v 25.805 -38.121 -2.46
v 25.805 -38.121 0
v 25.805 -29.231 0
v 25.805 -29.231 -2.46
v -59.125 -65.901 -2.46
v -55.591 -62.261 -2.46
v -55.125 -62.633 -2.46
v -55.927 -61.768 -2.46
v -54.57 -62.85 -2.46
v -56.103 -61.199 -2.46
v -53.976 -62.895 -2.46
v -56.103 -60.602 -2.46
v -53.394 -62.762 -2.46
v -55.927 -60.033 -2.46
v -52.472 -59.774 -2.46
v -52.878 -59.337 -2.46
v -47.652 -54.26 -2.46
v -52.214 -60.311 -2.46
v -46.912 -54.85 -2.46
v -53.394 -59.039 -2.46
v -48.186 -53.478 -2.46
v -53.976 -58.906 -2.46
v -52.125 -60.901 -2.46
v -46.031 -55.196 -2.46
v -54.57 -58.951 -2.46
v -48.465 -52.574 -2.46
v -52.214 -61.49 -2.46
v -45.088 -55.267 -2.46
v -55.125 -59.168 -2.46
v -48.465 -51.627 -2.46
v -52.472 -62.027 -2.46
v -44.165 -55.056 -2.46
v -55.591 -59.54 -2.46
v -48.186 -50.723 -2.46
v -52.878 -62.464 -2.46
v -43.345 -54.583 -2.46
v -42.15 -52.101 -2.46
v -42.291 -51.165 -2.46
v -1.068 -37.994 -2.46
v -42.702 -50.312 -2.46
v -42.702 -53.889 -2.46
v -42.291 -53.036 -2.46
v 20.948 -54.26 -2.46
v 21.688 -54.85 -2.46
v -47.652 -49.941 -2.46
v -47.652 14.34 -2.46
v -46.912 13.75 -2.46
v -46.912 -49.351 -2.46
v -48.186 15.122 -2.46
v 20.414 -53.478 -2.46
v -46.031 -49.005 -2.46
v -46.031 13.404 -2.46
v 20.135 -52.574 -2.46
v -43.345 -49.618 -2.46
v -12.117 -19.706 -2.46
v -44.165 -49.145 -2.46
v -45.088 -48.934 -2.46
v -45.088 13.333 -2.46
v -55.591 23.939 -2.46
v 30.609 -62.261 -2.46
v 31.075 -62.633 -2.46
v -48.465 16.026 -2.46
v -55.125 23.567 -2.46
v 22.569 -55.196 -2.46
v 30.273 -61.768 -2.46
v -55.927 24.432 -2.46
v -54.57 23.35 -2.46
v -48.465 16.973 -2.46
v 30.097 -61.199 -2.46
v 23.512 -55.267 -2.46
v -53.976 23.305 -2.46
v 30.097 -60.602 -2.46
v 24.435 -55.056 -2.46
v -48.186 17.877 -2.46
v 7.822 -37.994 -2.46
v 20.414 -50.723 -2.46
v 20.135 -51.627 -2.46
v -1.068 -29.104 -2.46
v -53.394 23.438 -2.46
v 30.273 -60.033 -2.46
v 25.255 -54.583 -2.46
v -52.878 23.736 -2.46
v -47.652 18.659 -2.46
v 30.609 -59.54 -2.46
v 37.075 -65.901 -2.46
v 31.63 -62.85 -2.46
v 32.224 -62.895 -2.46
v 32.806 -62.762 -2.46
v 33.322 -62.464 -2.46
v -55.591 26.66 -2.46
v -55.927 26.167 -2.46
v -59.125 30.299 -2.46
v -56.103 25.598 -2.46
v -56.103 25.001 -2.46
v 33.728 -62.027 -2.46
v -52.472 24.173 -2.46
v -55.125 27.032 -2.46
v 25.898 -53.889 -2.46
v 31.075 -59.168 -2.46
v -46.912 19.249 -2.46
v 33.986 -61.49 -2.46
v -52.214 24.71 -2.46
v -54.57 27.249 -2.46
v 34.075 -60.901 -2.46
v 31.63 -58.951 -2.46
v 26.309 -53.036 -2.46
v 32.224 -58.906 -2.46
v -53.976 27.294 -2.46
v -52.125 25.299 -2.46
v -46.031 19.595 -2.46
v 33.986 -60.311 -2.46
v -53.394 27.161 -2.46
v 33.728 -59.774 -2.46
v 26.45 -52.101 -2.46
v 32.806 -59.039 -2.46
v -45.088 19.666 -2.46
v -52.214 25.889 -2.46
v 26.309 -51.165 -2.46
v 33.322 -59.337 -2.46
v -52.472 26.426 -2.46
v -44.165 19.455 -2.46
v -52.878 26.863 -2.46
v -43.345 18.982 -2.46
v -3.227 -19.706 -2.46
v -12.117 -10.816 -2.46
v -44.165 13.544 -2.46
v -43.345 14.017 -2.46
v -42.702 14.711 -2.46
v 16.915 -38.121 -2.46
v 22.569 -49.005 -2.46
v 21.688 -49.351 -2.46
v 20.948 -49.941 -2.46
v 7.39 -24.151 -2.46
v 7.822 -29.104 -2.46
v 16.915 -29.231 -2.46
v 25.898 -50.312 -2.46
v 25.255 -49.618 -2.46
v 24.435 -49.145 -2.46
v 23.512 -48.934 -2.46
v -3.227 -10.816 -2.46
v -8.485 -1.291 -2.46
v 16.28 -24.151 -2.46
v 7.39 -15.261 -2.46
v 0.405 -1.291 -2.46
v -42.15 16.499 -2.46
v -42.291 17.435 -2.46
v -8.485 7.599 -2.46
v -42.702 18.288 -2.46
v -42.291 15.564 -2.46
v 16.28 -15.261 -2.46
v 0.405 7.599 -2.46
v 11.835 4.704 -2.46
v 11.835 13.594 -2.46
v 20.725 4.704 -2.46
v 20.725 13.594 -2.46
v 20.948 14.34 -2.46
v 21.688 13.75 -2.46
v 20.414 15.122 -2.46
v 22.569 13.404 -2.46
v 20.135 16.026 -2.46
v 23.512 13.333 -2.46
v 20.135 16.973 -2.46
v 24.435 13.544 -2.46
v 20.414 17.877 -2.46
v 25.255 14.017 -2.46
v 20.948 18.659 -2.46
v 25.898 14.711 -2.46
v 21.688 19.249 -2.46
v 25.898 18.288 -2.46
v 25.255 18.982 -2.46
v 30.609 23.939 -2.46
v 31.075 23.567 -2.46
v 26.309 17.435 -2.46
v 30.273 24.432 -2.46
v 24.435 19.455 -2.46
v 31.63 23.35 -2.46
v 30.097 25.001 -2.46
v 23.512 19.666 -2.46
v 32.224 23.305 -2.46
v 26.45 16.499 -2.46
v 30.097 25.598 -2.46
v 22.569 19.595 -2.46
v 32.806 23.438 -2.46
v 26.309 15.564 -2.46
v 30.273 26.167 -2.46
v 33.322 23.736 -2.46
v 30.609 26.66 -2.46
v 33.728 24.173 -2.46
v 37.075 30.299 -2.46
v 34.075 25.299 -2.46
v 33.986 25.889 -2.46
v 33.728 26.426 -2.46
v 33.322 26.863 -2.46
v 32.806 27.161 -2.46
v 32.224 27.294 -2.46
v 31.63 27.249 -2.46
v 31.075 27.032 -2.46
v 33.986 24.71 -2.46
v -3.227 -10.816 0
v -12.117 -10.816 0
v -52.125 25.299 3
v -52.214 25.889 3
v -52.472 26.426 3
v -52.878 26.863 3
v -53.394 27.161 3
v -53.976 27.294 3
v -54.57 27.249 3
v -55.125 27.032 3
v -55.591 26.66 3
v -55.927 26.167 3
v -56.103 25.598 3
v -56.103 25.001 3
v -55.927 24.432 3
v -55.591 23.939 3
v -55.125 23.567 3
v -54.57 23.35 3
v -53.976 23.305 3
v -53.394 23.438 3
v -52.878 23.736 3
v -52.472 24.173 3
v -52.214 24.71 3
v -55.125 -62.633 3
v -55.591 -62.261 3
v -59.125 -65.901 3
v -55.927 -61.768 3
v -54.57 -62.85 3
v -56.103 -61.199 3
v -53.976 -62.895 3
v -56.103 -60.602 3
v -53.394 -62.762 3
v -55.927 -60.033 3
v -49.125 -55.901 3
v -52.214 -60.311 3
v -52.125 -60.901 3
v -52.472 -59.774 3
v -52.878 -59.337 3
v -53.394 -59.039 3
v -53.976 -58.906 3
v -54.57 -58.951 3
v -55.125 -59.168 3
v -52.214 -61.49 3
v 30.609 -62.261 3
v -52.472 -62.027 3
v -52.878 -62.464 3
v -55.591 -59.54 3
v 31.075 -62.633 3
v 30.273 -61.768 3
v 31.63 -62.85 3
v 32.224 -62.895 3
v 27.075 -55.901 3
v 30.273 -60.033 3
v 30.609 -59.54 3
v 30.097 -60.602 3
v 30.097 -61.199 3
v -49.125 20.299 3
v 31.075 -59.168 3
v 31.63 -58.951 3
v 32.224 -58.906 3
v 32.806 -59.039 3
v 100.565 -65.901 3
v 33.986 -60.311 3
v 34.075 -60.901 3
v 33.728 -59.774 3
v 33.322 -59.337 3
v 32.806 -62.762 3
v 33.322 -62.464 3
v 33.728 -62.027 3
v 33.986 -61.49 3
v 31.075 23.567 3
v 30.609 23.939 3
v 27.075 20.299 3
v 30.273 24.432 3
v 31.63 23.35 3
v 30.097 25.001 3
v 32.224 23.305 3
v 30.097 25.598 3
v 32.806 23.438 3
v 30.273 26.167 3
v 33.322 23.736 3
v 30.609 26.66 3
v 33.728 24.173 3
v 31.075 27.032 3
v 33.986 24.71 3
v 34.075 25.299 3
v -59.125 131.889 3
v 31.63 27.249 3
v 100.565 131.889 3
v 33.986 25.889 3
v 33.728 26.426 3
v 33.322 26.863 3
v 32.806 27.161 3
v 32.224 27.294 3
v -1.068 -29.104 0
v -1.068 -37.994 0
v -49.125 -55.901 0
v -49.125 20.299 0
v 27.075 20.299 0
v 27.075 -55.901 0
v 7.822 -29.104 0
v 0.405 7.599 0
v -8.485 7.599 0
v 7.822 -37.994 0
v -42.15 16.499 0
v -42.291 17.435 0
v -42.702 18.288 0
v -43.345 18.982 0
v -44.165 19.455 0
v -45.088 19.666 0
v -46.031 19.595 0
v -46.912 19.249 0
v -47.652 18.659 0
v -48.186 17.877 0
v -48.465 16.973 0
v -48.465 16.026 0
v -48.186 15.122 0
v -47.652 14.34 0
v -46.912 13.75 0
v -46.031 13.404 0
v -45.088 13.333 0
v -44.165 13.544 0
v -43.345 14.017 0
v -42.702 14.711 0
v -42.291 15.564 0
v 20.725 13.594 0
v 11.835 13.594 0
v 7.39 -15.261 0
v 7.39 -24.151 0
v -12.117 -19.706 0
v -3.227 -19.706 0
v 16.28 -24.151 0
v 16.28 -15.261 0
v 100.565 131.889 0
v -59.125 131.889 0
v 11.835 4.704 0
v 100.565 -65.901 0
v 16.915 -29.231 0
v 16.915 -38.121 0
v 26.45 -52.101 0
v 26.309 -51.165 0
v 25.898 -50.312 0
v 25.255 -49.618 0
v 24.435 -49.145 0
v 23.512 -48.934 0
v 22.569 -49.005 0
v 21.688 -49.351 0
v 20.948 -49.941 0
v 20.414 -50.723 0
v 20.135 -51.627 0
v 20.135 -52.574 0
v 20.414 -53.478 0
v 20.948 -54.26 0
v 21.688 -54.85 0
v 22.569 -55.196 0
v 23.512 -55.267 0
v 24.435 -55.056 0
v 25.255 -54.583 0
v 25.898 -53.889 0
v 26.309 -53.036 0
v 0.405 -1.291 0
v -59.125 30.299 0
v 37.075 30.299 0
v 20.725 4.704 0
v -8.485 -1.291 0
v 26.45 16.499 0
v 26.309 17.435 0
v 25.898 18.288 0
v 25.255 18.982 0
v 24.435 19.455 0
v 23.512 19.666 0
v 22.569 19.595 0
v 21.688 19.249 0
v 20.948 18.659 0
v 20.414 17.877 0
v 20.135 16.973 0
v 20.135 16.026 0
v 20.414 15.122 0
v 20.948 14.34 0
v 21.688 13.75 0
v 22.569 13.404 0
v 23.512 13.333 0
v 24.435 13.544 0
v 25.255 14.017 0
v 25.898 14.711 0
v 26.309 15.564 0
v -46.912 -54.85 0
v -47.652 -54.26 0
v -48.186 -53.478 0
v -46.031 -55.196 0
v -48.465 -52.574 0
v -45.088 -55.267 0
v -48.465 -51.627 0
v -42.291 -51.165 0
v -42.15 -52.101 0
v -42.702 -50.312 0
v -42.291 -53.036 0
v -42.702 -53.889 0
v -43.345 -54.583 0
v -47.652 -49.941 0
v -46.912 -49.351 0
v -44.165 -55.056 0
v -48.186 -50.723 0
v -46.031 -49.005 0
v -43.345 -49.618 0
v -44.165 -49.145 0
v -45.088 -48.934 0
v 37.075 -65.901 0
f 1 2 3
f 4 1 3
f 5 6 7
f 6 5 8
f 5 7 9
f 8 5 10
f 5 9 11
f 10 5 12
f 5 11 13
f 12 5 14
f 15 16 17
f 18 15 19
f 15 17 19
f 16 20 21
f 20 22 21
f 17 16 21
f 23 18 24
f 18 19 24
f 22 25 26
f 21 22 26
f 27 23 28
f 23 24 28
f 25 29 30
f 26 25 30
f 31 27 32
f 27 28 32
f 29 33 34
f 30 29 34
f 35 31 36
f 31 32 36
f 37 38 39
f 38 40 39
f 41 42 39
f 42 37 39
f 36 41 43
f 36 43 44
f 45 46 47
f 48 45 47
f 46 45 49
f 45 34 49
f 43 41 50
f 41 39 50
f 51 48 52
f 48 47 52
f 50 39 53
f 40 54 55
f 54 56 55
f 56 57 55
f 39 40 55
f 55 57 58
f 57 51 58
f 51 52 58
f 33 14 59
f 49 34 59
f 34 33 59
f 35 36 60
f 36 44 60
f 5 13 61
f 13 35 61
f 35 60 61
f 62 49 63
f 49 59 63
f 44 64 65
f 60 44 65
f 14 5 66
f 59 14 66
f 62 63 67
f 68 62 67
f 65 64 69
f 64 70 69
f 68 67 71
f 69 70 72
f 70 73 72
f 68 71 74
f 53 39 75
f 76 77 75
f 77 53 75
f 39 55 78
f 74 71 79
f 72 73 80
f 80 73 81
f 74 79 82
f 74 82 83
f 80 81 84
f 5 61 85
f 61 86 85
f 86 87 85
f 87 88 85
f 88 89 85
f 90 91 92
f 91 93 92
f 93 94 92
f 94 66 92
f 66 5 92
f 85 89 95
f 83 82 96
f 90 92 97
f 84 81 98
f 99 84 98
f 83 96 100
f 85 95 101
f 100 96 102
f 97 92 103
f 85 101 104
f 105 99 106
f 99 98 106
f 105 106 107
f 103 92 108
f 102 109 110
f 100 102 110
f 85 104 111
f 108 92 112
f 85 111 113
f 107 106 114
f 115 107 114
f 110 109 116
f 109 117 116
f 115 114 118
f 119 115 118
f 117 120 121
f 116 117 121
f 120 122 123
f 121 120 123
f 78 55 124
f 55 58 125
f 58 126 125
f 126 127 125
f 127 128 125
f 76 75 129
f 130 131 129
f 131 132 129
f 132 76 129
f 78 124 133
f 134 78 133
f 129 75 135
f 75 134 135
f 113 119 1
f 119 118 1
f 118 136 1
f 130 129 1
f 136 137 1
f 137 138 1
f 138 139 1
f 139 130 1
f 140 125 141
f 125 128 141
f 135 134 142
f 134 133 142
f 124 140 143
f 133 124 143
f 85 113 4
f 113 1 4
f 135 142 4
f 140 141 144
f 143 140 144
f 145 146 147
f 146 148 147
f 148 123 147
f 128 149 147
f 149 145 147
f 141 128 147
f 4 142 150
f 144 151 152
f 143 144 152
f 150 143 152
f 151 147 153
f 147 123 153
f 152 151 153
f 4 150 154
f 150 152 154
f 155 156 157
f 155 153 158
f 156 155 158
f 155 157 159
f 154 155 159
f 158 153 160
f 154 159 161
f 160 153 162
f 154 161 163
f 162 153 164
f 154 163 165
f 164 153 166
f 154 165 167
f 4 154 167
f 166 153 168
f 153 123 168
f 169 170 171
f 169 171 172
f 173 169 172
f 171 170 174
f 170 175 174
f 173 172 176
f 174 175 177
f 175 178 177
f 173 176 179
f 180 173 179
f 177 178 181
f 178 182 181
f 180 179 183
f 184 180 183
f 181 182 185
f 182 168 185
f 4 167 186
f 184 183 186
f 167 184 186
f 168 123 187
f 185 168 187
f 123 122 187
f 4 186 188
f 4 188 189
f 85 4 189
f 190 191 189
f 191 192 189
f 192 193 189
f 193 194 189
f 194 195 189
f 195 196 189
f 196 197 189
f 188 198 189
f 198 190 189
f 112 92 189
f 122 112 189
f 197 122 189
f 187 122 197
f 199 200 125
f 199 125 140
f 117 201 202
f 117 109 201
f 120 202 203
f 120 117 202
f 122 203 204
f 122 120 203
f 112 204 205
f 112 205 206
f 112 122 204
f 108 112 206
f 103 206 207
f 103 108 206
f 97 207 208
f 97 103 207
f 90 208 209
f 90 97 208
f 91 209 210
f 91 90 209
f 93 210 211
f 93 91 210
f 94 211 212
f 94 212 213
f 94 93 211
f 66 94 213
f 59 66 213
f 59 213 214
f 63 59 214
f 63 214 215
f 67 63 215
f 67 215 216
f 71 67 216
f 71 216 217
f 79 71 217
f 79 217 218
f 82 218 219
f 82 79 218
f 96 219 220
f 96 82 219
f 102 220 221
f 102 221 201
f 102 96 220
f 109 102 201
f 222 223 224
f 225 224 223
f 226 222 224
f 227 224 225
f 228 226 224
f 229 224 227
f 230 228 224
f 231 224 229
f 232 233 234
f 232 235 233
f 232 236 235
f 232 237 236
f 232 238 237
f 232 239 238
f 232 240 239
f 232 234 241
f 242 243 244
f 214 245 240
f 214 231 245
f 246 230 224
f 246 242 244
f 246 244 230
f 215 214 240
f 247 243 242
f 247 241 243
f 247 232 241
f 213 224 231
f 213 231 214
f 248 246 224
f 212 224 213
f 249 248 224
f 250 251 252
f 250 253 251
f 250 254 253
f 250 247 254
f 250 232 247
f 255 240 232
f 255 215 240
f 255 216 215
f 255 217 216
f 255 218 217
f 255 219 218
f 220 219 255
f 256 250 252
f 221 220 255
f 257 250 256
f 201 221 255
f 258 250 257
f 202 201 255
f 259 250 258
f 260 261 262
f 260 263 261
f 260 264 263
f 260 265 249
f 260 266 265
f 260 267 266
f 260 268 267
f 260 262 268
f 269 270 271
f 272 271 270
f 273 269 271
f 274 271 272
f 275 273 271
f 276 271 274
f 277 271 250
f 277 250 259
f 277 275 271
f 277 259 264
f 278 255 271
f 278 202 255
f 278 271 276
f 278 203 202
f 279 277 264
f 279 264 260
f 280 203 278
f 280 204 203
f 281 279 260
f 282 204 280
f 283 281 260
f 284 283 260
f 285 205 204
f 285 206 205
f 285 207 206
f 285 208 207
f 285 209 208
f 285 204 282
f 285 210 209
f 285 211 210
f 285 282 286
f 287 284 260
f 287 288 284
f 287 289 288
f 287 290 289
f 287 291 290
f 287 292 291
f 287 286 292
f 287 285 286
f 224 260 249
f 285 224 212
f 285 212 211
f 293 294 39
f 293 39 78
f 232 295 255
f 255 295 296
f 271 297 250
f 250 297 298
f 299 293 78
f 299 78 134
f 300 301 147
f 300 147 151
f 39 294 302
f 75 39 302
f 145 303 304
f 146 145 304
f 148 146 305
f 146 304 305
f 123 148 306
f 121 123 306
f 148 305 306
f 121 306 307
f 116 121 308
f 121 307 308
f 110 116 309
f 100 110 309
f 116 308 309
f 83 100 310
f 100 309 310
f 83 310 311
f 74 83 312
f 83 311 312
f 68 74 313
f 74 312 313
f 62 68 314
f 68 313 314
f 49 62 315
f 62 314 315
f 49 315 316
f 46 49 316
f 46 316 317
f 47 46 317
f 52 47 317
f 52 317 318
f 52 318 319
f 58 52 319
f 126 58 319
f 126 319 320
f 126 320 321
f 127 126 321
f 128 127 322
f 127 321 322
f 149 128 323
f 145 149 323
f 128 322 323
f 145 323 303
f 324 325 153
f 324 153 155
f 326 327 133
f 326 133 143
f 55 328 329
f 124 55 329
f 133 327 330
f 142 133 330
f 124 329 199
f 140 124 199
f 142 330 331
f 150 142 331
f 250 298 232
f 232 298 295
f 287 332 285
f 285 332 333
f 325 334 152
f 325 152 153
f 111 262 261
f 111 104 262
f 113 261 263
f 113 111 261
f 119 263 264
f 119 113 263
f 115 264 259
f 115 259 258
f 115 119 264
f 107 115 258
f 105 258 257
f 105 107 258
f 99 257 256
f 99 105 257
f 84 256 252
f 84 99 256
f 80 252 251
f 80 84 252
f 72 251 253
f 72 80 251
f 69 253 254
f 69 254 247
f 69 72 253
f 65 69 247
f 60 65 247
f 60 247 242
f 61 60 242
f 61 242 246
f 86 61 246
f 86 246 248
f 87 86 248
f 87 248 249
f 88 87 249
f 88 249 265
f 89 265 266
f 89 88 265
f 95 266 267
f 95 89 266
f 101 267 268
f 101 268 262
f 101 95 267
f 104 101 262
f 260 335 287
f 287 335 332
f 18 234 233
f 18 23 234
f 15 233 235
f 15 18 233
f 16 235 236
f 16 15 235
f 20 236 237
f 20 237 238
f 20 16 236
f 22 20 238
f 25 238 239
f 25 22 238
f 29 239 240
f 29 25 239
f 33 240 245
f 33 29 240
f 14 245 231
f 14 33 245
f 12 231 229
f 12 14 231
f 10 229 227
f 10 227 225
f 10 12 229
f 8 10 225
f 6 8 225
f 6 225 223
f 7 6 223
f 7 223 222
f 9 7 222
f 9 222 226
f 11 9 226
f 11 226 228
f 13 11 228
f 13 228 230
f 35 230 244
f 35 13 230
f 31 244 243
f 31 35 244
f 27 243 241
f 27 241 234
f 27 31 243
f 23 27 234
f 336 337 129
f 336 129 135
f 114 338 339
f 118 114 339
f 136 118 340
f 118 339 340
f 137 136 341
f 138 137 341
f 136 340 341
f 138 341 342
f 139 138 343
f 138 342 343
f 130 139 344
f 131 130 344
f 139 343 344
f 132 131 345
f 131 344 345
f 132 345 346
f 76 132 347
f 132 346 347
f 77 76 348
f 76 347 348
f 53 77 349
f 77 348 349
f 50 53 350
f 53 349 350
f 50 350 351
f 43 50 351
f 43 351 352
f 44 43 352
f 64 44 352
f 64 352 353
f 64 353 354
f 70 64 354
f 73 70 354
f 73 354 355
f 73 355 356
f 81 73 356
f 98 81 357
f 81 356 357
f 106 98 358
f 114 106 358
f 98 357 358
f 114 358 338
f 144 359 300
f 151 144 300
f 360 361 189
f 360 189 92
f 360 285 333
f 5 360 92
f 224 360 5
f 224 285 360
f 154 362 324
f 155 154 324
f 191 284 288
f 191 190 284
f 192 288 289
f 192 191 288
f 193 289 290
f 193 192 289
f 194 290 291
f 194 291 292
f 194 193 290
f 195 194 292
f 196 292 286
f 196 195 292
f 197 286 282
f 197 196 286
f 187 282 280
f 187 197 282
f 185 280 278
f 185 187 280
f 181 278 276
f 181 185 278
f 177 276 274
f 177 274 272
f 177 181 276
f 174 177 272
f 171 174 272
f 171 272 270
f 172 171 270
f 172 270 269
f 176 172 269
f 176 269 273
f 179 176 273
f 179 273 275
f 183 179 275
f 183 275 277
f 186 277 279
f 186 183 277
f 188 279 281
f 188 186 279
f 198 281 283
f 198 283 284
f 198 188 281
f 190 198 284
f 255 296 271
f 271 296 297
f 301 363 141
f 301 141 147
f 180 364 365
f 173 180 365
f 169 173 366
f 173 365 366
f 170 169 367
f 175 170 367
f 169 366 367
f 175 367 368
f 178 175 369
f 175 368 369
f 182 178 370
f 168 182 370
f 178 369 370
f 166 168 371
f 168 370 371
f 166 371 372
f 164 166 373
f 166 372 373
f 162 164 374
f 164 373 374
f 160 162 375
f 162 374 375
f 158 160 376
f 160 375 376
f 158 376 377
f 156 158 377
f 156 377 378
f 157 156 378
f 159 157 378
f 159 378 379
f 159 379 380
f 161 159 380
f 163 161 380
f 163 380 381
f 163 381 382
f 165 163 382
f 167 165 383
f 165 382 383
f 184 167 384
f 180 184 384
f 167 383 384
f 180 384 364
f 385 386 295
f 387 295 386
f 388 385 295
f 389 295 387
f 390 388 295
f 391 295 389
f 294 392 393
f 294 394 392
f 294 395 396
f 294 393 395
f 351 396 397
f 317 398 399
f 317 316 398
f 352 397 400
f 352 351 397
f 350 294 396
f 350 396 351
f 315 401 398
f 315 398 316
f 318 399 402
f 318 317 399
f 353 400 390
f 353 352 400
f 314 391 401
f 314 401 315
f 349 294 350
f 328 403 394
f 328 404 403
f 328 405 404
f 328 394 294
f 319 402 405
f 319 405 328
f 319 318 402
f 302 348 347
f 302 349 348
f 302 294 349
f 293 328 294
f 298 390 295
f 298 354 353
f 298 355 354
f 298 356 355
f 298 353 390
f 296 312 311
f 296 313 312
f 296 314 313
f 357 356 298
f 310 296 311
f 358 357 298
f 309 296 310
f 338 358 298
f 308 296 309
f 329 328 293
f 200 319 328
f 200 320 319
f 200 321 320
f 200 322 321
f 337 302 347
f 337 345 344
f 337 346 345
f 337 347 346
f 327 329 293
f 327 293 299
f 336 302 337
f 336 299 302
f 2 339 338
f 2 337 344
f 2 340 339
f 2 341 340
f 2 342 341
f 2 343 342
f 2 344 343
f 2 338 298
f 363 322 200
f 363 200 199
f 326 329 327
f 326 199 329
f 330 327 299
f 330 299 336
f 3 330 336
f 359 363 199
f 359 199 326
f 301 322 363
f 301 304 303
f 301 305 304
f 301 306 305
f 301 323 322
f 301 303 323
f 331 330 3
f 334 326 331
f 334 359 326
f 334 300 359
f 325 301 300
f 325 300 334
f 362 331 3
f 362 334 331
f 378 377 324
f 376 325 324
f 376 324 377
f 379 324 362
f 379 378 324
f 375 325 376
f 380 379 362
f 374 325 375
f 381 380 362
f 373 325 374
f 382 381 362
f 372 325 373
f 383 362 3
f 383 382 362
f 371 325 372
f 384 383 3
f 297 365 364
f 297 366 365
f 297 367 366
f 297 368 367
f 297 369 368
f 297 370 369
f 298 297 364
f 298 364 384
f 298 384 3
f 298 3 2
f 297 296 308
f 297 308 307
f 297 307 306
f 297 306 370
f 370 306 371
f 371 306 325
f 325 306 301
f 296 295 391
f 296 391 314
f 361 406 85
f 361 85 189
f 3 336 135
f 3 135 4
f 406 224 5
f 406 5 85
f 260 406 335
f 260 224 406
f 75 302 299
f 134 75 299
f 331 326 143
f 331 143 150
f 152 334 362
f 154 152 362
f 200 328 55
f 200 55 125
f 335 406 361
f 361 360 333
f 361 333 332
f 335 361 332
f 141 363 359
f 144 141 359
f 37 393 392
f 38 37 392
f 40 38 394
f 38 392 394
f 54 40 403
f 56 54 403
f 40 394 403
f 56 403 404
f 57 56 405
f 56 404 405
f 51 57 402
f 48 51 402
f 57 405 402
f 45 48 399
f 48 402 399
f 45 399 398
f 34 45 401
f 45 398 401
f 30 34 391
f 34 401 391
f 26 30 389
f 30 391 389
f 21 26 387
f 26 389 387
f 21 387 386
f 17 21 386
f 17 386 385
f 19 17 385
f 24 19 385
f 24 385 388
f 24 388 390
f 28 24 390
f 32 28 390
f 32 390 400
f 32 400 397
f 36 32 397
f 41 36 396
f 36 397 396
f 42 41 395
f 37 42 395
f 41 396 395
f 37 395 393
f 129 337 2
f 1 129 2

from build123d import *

# Parameters (mm, degrees)
F0_R     = 2
F1_DEPTH = 3
F0_R_2   = 3.175
F0_W     = 8.89
F0_H     = 8.89
F2_DEPTH = 2.46
F3_DEPTH = 3


with BuildPart() as f1:
    # F0 (on Top) → F1 (new body)
    with BuildSketch(Plane.XY):
        Polygon((-49.1249652207, 30.2994954109), (-49.1249652207, 20.2994954109), (-48.8709652207, 20.2994954109), (-45.1879652207, 20.2994954109), (23.1380347793, 20.2994954109), (26.8210347793, 20.2994954109), (27.0750347793, 20.2994954109), (27.0750347793, 20.4264954109), (27.0750347793, 30.2994954109), align=None)
        Polygon((-59.1249652207, 25.2994954109), (-59.1249652207, 20.2994954109), (-54.1249652207, 20.2994954109), (-49.1249652207, 20.2994954109), (-49.1249652207, 30.2994954109), (-59.1249652207, 30.2994954109), align=None)
        with Locations((-54.1249652207, 25.2994954109)):
            Circle(F0_R, mode=Mode.SUBTRACT)
        Polygon((-59.1249652207, -60.9005045891), (-59.1249652207, -65.9005045891), (-54.1249652207, -65.9005045891), (-49.1249652207, -65.9005045891), (-49.1249652207, -55.9005045891), (-59.1249652207, -55.9005045891), align=None)
        with Locations((-54.1249652207, -60.9005045891)):
            Circle(F0_R, mode=Mode.SUBTRACT)
        Polygon((-59.1249652207, -30.5005045891), (-59.1249652207, -55.9005045891), (-49.1249652207, -55.9005045891), (-49.1249652207, -55.6465045891), (-49.1249652207, -54.1503839195), (-49.1249652207, -51.9635045891), (-49.1249652207, -30.5005045891), align=None)
        Polygon((-59.1249652207, 20.2994954109), (-59.1249652207, -30.5005045891), (-49.1249652207, -30.5005045891), (-49.1249652207, 16.3624954109), (-49.1249652207, 20.0454954109), (-49.1249652207, 20.2994954109), (-54.1249652207, 20.2994954109), align=None)
        Polygon((27.0750347793, -55.6465045891), (27.0750347793, -55.9005045891), (27.1951819298, -55.9005045891), (37.0750347793, -55.9005045891), (37.0750347793, 20.2994954109), (32.0750347793, 20.2994954109), (27.3221819298, 20.2994954109), (27.0750347793, 20.2994954109), (27.0750347793, 20.0454954109), (27.0750347793, 16.3624954109), (27.0750347793, 4.7038954109), (27.0750347793, -1.2905045891), (27.0750347793, -19.7055045891), (27.0750347793, -24.1505045891), (27.0750347793, -37.9935045891), (27.0750347793, -38.1205045891), (27.0750347793, -51.9635045891), align=None)
        Polygon((32.0750347793, 20.2994954109), (37.0750347793, 20.2994954109), (37.0750347793, 25.2994954109), (37.0750347793, 30.2994954109), (27.0750347793, 30.2994954109), (27.0750347793, 20.4264954109), (27.0750347793, 20.2994954109), (27.3221819298, 20.2994954109), align=None)
        with Locations((32.0750347793, 25.2994954109)):
            Circle(F0_R, mode=Mode.SUBTRACT)
        Polygon((27.0750347793, -55.9005045891), (27.0750347793, -65.9005045891), (32.0750347793, -65.9005045891), (37.0750347793, -65.9005045891), (37.0750347793, -60.9005045891), (37.0750347793, -55.9005045891), (27.1951819298, -55.9005045891), align=None)
        with Locations((32.0750347793, -60.9005045891)):
            Circle(F0_R, mode=Mode.SUBTRACT)
        Polygon((-49.1249652207, -55.9005045891), (-49.1249652207, -65.9005045891), (27.0750347793, -65.9005045891), (27.0750347793, -55.9005045891), (26.8210347793, -55.9005045891), (26.5670347793, -55.9005045891), (24.5350347793, -55.9005045891), (23.5190347793, -55.9005045891), (23.1380347793, -55.9005045891), (6.5518347793, -55.9005045891), (-0.8649652207, -55.9005045891), (-4.4971652207, -55.9005045891), (-45.1879652207, -55.9005045891), (-48.8709652207, -55.9005045891), align=None)
    extrude(amount=F1_DEPTH)

    # F0 (on Top) → F2 (join)
    with BuildSketch(Plane.XY):
        Polygon((32.0750347793, 20.2994954109), (37.0750347793, 20.2994954109), (37.0750347793, 25.2994954109), (37.0750347793, 30.2994954109), (27.0750347793, 30.2994954109), (27.0750347793, 20.4264954109), (27.0750347793, 20.2994954109), (27.3221819298, 20.2994954109), align=None)
        with Locations((32.0750347793, 25.2994954109)):
            Circle(F0_R, mode=Mode.SUBTRACT)
        Polygon((27.0750347793, -55.6465045891), (27.0750347793, -55.9005045891), (27.1951819298, -55.9005045891), (37.0750347793, -55.9005045891), (37.0750347793, 20.2994954109), (32.0750347793, 20.2994954109), (27.3221819298, 20.2994954109), (27.0750347793, 20.2994954109), (27.0750347793, 20.0454954109), (27.0750347793, 16.3624954109), (27.0750347793, 4.7038954109), (27.0750347793, -1.2905045891), (27.0750347793, -19.7055045891), (27.0750347793, -24.1505045891), (27.0750347793, -37.9935045891), (27.0750347793, -38.1205045891), (27.0750347793, -51.9635045891), align=None)
        Polygon((-49.1249652207, 30.2994954109), (-49.1249652207, 20.2994954109), (-48.8709652207, 20.2994954109), (-45.1879652207, 20.2994954109), (23.1380347793, 20.2994954109), (26.8210347793, 20.2994954109), (27.0750347793, 20.2994954109), (27.0750347793, 20.4264954109), (27.0750347793, 30.2994954109), align=None)
        Polygon((-59.1249652207, 25.2994954109), (-59.1249652207, 20.2994954109), (-54.1249652207, 20.2994954109), (-49.1249652207, 20.2994954109), (-49.1249652207, 30.2994954109), (-59.1249652207, 30.2994954109), align=None)
        with Locations((-54.1249652207, 25.2994954109)):
            Circle(F0_R, mode=Mode.SUBTRACT)
        Polygon((-59.1249652207, 20.2994954109), (-59.1249652207, -30.5005045891), (-49.1249652207, -30.5005045891), (-49.1249652207, 16.3624954109), (-49.1249652207, 20.0454954109), (-49.1249652207, 20.2994954109), (-54.1249652207, 20.2994954109), align=None)
        Polygon((-59.1249652207, -60.9005045891), (-59.1249652207, -65.9005045891), (-54.1249652207, -65.9005045891), (-49.1249652207, -65.9005045891), (-49.1249652207, -55.9005045891), (-59.1249652207, -55.9005045891), align=None)
        with Locations((-54.1249652207, -60.9005045891)):
            Circle(F0_R, mode=Mode.SUBTRACT)
        Polygon((-59.1249652207, -30.5005045891), (-59.1249652207, -55.9005045891), (-49.1249652207, -55.9005045891), (-49.1249652207, -55.6465045891), (-49.1249652207, -54.1503839195), (-49.1249652207, -51.9635045891), (-49.1249652207, -30.5005045891), align=None)
        Polygon((-49.1249652207, -55.9005045891), (-49.1249652207, -65.9005045891), (27.0750347793, -65.9005045891), (27.0750347793, -55.9005045891), (26.8210347793, -55.9005045891), (26.5670347793, -55.9005045891), (24.5350347793, -55.9005045891), (23.5190347793, -55.9005045891), (23.1380347793, -55.9005045891), (6.5518347793, -55.9005045891), (-0.8649652207, -55.9005045891), (-4.4971652207, -55.9005045891), (-45.1879652207, -55.9005045891), (-48.8709652207, -55.9005045891), align=None)
        Polygon((27.0750347793, -55.9005045891), (27.0750347793, -65.9005045891), (32.0750347793, -65.9005045891), (37.0750347793, -65.9005045891), (37.0750347793, -60.9005045891), (37.0750347793, -55.9005045891), (27.1951819298, -55.9005045891), align=None)
        with Locations((32.0750347793, -60.9005045891)):
            Circle(F0_R, mode=Mode.SUBTRACT)
        Polygon((-49.1249652207, -55.6465045891), (-49.1249652207, -55.9005045891), (-48.8709652207, -55.9005045891), (-45.1879652207, -55.9005045891), (-4.4971652207, -55.9005045891), (-0.8649652207, -55.9005045891), (6.5518347793, -55.9005045891), (23.1380347793, -55.9005045891), (23.5190347793, -55.9005045891), (24.5350347793, -55.9005045891), (26.5670347793, -55.9005045891), (26.8210347793, -55.9005045891), (27.0750347793, -55.9005045891), (27.0750347793, -55.6465045891), (27.0750347793, -51.9635045891), (27.0750347793, -38.1205045891), (27.0750347793, -37.9935045891), (27.0750347793, -24.1505045891), (27.0750347793, -19.7055045891), (27.0750347793, -1.2905045891), (27.0750347793, 4.7038954109), (27.0750347793, 16.3624954109), (27.0750347793, 20.0454954109), (27.0750347793, 20.2994954109), (26.8210347793, 20.2994954109), (23.1380347793, 20.2994954109), (-45.1879652207, 20.2994954109), (-48.8709652207, 20.2994954109), (-49.1249652207, 20.2994954109), (-49.1249652207, 20.0454954109), (-49.1249652207, 16.3624954109), (-49.1249652207, -30.5005045891), (-49.1249652207, -51.9635045891), (-49.1249652207, -54.1503839195), align=None)
        with Locations((-45.3249652207, -52.1005045891)):
            Circle(F0_R_2, mode=Mode.SUBTRACT)
        with Locations((3.3768347793, -33.5485045891)):
            Rectangle(F0_W, F0_H, mode=Mode.SUBTRACT)
        with Locations((11.8350347793, -19.7055045891)):
            Rectangle(F0_W, F0_H, mode=Mode.SUBTRACT)
        with Locations((-45.3249652207, 16.4994954109)):
            Circle(F0_R_2, mode=Mode.SUBTRACT)
        with Locations((-7.6721652207, -15.2605045891)):
            Rectangle(F0_W, F0_H, mode=Mode.SUBTRACT)
        with Locations((-4.0399652207, 3.1544954109)):
            Rectangle(F0_W, F0_H, mode=Mode.SUBTRACT)
        with Locations((16.2800347793, 9.1488954109)):
            Rectangle(F0_W, F0_H, mode=Mode.SUBTRACT)
        with Locations((23.2750347793, -52.1005045891)):
            Circle(F0_R_2, mode=Mode.SUBTRACT)
        with Locations((21.3600347793, -33.6755045891)):
            Rectangle(F0_W, F0_H, mode=Mode.SUBTRACT)
        with Locations((23.2750347793, 16.4994954109)):
            Circle(F0_R_2, mode=Mode.SUBTRACT)
    extrude(amount=-F2_DEPTH)

    # F0 (on Top) → F3 (join)
    with BuildSketch(Plane.XY):
        Polygon((-59.1249652207, -60.9005045891), (-59.1249652207, -65.9005045891), (-54.1249652207, -65.9005045891), (-49.1249652207, -65.9005045891), (-49.1249652207, -55.9005045891), (-59.1249652207, -55.9005045891), align=None)
        with Locations((-54.1249652207, -60.9005045891)):
            Circle(F0_R, mode=Mode.SUBTRACT)
        Polygon((-49.1249652207, -55.9005045891), (-49.1249652207, -65.9005045891), (27.0750347793, -65.9005045891), (27.0750347793, -55.9005045891), (26.8210347793, -55.9005045891), (26.5670347793, -55.9005045891), (24.5350347793, -55.9005045891), (23.5190347793, -55.9005045891), (23.1380347793, -55.9005045891), (6.5518347793, -55.9005045891), (-0.8649652207, -55.9005045891), (-4.4971652207, -55.9005045891), (-45.1879652207, -55.9005045891), (-48.8709652207, -55.9005045891), align=None)
        Polygon((-59.1249652207, -30.5005045891), (-59.1249652207, -55.9005045891), (-49.1249652207, -55.9005045891), (-49.1249652207, -55.6465045891), (-49.1249652207, -54.1503839195), (-49.1249652207, -51.9635045891), (-49.1249652207, -30.5005045891), align=None)
        Polygon((27.0750347793, -55.9005045891), (27.0750347793, -65.9005045891), (32.0750347793, -65.9005045891), (37.0750347793, -65.9005045891), (37.0750347793, -60.9005045891), (37.0750347793, -55.9005045891), (27.1951819298, -55.9005045891), align=None)
        with Locations((32.0750347793, -60.9005045891)):
            Circle(F0_R, mode=Mode.SUBTRACT)
        Polygon((-59.1249652207, 20.2994954109), (-59.1249652207, -30.5005045891), (-49.1249652207, -30.5005045891), (-49.1249652207, 16.3624954109), (-49.1249652207, 20.0454954109), (-49.1249652207, 20.2994954109), (-54.1249652207, 20.2994954109), align=None)
        Polygon((-59.1249652207, 25.2994954109), (-59.1249652207, 20.2994954109), (-54.1249652207, 20.2994954109), (-49.1249652207, 20.2994954109), (-49.1249652207, 30.2994954109), (-59.1249652207, 30.2994954109), align=None)
        with Locations((-54.1249652207, 25.2994954109)):
            Circle(F0_R, mode=Mode.SUBTRACT)
        Polygon((37.0750347793, -60.9005045891), (37.0750347793, -65.9005045891), (100.5648347793, -65.9005045891), (100.5648347793, 131.8892954109), (-59.1249652207, 131.8892954109), (-59.1249652207, 30.2994954109), (-49.1249652207, 30.2994954109), (27.0750347793, 30.2994954109), (37.0750347793, 30.2994954109), (37.0750347793, 25.2994954109), (37.0750347793, 20.2994954109), (37.0750347793, -55.9005045891), align=None)
    extrude(amount=F3_DEPTH)


solid = f1.part
